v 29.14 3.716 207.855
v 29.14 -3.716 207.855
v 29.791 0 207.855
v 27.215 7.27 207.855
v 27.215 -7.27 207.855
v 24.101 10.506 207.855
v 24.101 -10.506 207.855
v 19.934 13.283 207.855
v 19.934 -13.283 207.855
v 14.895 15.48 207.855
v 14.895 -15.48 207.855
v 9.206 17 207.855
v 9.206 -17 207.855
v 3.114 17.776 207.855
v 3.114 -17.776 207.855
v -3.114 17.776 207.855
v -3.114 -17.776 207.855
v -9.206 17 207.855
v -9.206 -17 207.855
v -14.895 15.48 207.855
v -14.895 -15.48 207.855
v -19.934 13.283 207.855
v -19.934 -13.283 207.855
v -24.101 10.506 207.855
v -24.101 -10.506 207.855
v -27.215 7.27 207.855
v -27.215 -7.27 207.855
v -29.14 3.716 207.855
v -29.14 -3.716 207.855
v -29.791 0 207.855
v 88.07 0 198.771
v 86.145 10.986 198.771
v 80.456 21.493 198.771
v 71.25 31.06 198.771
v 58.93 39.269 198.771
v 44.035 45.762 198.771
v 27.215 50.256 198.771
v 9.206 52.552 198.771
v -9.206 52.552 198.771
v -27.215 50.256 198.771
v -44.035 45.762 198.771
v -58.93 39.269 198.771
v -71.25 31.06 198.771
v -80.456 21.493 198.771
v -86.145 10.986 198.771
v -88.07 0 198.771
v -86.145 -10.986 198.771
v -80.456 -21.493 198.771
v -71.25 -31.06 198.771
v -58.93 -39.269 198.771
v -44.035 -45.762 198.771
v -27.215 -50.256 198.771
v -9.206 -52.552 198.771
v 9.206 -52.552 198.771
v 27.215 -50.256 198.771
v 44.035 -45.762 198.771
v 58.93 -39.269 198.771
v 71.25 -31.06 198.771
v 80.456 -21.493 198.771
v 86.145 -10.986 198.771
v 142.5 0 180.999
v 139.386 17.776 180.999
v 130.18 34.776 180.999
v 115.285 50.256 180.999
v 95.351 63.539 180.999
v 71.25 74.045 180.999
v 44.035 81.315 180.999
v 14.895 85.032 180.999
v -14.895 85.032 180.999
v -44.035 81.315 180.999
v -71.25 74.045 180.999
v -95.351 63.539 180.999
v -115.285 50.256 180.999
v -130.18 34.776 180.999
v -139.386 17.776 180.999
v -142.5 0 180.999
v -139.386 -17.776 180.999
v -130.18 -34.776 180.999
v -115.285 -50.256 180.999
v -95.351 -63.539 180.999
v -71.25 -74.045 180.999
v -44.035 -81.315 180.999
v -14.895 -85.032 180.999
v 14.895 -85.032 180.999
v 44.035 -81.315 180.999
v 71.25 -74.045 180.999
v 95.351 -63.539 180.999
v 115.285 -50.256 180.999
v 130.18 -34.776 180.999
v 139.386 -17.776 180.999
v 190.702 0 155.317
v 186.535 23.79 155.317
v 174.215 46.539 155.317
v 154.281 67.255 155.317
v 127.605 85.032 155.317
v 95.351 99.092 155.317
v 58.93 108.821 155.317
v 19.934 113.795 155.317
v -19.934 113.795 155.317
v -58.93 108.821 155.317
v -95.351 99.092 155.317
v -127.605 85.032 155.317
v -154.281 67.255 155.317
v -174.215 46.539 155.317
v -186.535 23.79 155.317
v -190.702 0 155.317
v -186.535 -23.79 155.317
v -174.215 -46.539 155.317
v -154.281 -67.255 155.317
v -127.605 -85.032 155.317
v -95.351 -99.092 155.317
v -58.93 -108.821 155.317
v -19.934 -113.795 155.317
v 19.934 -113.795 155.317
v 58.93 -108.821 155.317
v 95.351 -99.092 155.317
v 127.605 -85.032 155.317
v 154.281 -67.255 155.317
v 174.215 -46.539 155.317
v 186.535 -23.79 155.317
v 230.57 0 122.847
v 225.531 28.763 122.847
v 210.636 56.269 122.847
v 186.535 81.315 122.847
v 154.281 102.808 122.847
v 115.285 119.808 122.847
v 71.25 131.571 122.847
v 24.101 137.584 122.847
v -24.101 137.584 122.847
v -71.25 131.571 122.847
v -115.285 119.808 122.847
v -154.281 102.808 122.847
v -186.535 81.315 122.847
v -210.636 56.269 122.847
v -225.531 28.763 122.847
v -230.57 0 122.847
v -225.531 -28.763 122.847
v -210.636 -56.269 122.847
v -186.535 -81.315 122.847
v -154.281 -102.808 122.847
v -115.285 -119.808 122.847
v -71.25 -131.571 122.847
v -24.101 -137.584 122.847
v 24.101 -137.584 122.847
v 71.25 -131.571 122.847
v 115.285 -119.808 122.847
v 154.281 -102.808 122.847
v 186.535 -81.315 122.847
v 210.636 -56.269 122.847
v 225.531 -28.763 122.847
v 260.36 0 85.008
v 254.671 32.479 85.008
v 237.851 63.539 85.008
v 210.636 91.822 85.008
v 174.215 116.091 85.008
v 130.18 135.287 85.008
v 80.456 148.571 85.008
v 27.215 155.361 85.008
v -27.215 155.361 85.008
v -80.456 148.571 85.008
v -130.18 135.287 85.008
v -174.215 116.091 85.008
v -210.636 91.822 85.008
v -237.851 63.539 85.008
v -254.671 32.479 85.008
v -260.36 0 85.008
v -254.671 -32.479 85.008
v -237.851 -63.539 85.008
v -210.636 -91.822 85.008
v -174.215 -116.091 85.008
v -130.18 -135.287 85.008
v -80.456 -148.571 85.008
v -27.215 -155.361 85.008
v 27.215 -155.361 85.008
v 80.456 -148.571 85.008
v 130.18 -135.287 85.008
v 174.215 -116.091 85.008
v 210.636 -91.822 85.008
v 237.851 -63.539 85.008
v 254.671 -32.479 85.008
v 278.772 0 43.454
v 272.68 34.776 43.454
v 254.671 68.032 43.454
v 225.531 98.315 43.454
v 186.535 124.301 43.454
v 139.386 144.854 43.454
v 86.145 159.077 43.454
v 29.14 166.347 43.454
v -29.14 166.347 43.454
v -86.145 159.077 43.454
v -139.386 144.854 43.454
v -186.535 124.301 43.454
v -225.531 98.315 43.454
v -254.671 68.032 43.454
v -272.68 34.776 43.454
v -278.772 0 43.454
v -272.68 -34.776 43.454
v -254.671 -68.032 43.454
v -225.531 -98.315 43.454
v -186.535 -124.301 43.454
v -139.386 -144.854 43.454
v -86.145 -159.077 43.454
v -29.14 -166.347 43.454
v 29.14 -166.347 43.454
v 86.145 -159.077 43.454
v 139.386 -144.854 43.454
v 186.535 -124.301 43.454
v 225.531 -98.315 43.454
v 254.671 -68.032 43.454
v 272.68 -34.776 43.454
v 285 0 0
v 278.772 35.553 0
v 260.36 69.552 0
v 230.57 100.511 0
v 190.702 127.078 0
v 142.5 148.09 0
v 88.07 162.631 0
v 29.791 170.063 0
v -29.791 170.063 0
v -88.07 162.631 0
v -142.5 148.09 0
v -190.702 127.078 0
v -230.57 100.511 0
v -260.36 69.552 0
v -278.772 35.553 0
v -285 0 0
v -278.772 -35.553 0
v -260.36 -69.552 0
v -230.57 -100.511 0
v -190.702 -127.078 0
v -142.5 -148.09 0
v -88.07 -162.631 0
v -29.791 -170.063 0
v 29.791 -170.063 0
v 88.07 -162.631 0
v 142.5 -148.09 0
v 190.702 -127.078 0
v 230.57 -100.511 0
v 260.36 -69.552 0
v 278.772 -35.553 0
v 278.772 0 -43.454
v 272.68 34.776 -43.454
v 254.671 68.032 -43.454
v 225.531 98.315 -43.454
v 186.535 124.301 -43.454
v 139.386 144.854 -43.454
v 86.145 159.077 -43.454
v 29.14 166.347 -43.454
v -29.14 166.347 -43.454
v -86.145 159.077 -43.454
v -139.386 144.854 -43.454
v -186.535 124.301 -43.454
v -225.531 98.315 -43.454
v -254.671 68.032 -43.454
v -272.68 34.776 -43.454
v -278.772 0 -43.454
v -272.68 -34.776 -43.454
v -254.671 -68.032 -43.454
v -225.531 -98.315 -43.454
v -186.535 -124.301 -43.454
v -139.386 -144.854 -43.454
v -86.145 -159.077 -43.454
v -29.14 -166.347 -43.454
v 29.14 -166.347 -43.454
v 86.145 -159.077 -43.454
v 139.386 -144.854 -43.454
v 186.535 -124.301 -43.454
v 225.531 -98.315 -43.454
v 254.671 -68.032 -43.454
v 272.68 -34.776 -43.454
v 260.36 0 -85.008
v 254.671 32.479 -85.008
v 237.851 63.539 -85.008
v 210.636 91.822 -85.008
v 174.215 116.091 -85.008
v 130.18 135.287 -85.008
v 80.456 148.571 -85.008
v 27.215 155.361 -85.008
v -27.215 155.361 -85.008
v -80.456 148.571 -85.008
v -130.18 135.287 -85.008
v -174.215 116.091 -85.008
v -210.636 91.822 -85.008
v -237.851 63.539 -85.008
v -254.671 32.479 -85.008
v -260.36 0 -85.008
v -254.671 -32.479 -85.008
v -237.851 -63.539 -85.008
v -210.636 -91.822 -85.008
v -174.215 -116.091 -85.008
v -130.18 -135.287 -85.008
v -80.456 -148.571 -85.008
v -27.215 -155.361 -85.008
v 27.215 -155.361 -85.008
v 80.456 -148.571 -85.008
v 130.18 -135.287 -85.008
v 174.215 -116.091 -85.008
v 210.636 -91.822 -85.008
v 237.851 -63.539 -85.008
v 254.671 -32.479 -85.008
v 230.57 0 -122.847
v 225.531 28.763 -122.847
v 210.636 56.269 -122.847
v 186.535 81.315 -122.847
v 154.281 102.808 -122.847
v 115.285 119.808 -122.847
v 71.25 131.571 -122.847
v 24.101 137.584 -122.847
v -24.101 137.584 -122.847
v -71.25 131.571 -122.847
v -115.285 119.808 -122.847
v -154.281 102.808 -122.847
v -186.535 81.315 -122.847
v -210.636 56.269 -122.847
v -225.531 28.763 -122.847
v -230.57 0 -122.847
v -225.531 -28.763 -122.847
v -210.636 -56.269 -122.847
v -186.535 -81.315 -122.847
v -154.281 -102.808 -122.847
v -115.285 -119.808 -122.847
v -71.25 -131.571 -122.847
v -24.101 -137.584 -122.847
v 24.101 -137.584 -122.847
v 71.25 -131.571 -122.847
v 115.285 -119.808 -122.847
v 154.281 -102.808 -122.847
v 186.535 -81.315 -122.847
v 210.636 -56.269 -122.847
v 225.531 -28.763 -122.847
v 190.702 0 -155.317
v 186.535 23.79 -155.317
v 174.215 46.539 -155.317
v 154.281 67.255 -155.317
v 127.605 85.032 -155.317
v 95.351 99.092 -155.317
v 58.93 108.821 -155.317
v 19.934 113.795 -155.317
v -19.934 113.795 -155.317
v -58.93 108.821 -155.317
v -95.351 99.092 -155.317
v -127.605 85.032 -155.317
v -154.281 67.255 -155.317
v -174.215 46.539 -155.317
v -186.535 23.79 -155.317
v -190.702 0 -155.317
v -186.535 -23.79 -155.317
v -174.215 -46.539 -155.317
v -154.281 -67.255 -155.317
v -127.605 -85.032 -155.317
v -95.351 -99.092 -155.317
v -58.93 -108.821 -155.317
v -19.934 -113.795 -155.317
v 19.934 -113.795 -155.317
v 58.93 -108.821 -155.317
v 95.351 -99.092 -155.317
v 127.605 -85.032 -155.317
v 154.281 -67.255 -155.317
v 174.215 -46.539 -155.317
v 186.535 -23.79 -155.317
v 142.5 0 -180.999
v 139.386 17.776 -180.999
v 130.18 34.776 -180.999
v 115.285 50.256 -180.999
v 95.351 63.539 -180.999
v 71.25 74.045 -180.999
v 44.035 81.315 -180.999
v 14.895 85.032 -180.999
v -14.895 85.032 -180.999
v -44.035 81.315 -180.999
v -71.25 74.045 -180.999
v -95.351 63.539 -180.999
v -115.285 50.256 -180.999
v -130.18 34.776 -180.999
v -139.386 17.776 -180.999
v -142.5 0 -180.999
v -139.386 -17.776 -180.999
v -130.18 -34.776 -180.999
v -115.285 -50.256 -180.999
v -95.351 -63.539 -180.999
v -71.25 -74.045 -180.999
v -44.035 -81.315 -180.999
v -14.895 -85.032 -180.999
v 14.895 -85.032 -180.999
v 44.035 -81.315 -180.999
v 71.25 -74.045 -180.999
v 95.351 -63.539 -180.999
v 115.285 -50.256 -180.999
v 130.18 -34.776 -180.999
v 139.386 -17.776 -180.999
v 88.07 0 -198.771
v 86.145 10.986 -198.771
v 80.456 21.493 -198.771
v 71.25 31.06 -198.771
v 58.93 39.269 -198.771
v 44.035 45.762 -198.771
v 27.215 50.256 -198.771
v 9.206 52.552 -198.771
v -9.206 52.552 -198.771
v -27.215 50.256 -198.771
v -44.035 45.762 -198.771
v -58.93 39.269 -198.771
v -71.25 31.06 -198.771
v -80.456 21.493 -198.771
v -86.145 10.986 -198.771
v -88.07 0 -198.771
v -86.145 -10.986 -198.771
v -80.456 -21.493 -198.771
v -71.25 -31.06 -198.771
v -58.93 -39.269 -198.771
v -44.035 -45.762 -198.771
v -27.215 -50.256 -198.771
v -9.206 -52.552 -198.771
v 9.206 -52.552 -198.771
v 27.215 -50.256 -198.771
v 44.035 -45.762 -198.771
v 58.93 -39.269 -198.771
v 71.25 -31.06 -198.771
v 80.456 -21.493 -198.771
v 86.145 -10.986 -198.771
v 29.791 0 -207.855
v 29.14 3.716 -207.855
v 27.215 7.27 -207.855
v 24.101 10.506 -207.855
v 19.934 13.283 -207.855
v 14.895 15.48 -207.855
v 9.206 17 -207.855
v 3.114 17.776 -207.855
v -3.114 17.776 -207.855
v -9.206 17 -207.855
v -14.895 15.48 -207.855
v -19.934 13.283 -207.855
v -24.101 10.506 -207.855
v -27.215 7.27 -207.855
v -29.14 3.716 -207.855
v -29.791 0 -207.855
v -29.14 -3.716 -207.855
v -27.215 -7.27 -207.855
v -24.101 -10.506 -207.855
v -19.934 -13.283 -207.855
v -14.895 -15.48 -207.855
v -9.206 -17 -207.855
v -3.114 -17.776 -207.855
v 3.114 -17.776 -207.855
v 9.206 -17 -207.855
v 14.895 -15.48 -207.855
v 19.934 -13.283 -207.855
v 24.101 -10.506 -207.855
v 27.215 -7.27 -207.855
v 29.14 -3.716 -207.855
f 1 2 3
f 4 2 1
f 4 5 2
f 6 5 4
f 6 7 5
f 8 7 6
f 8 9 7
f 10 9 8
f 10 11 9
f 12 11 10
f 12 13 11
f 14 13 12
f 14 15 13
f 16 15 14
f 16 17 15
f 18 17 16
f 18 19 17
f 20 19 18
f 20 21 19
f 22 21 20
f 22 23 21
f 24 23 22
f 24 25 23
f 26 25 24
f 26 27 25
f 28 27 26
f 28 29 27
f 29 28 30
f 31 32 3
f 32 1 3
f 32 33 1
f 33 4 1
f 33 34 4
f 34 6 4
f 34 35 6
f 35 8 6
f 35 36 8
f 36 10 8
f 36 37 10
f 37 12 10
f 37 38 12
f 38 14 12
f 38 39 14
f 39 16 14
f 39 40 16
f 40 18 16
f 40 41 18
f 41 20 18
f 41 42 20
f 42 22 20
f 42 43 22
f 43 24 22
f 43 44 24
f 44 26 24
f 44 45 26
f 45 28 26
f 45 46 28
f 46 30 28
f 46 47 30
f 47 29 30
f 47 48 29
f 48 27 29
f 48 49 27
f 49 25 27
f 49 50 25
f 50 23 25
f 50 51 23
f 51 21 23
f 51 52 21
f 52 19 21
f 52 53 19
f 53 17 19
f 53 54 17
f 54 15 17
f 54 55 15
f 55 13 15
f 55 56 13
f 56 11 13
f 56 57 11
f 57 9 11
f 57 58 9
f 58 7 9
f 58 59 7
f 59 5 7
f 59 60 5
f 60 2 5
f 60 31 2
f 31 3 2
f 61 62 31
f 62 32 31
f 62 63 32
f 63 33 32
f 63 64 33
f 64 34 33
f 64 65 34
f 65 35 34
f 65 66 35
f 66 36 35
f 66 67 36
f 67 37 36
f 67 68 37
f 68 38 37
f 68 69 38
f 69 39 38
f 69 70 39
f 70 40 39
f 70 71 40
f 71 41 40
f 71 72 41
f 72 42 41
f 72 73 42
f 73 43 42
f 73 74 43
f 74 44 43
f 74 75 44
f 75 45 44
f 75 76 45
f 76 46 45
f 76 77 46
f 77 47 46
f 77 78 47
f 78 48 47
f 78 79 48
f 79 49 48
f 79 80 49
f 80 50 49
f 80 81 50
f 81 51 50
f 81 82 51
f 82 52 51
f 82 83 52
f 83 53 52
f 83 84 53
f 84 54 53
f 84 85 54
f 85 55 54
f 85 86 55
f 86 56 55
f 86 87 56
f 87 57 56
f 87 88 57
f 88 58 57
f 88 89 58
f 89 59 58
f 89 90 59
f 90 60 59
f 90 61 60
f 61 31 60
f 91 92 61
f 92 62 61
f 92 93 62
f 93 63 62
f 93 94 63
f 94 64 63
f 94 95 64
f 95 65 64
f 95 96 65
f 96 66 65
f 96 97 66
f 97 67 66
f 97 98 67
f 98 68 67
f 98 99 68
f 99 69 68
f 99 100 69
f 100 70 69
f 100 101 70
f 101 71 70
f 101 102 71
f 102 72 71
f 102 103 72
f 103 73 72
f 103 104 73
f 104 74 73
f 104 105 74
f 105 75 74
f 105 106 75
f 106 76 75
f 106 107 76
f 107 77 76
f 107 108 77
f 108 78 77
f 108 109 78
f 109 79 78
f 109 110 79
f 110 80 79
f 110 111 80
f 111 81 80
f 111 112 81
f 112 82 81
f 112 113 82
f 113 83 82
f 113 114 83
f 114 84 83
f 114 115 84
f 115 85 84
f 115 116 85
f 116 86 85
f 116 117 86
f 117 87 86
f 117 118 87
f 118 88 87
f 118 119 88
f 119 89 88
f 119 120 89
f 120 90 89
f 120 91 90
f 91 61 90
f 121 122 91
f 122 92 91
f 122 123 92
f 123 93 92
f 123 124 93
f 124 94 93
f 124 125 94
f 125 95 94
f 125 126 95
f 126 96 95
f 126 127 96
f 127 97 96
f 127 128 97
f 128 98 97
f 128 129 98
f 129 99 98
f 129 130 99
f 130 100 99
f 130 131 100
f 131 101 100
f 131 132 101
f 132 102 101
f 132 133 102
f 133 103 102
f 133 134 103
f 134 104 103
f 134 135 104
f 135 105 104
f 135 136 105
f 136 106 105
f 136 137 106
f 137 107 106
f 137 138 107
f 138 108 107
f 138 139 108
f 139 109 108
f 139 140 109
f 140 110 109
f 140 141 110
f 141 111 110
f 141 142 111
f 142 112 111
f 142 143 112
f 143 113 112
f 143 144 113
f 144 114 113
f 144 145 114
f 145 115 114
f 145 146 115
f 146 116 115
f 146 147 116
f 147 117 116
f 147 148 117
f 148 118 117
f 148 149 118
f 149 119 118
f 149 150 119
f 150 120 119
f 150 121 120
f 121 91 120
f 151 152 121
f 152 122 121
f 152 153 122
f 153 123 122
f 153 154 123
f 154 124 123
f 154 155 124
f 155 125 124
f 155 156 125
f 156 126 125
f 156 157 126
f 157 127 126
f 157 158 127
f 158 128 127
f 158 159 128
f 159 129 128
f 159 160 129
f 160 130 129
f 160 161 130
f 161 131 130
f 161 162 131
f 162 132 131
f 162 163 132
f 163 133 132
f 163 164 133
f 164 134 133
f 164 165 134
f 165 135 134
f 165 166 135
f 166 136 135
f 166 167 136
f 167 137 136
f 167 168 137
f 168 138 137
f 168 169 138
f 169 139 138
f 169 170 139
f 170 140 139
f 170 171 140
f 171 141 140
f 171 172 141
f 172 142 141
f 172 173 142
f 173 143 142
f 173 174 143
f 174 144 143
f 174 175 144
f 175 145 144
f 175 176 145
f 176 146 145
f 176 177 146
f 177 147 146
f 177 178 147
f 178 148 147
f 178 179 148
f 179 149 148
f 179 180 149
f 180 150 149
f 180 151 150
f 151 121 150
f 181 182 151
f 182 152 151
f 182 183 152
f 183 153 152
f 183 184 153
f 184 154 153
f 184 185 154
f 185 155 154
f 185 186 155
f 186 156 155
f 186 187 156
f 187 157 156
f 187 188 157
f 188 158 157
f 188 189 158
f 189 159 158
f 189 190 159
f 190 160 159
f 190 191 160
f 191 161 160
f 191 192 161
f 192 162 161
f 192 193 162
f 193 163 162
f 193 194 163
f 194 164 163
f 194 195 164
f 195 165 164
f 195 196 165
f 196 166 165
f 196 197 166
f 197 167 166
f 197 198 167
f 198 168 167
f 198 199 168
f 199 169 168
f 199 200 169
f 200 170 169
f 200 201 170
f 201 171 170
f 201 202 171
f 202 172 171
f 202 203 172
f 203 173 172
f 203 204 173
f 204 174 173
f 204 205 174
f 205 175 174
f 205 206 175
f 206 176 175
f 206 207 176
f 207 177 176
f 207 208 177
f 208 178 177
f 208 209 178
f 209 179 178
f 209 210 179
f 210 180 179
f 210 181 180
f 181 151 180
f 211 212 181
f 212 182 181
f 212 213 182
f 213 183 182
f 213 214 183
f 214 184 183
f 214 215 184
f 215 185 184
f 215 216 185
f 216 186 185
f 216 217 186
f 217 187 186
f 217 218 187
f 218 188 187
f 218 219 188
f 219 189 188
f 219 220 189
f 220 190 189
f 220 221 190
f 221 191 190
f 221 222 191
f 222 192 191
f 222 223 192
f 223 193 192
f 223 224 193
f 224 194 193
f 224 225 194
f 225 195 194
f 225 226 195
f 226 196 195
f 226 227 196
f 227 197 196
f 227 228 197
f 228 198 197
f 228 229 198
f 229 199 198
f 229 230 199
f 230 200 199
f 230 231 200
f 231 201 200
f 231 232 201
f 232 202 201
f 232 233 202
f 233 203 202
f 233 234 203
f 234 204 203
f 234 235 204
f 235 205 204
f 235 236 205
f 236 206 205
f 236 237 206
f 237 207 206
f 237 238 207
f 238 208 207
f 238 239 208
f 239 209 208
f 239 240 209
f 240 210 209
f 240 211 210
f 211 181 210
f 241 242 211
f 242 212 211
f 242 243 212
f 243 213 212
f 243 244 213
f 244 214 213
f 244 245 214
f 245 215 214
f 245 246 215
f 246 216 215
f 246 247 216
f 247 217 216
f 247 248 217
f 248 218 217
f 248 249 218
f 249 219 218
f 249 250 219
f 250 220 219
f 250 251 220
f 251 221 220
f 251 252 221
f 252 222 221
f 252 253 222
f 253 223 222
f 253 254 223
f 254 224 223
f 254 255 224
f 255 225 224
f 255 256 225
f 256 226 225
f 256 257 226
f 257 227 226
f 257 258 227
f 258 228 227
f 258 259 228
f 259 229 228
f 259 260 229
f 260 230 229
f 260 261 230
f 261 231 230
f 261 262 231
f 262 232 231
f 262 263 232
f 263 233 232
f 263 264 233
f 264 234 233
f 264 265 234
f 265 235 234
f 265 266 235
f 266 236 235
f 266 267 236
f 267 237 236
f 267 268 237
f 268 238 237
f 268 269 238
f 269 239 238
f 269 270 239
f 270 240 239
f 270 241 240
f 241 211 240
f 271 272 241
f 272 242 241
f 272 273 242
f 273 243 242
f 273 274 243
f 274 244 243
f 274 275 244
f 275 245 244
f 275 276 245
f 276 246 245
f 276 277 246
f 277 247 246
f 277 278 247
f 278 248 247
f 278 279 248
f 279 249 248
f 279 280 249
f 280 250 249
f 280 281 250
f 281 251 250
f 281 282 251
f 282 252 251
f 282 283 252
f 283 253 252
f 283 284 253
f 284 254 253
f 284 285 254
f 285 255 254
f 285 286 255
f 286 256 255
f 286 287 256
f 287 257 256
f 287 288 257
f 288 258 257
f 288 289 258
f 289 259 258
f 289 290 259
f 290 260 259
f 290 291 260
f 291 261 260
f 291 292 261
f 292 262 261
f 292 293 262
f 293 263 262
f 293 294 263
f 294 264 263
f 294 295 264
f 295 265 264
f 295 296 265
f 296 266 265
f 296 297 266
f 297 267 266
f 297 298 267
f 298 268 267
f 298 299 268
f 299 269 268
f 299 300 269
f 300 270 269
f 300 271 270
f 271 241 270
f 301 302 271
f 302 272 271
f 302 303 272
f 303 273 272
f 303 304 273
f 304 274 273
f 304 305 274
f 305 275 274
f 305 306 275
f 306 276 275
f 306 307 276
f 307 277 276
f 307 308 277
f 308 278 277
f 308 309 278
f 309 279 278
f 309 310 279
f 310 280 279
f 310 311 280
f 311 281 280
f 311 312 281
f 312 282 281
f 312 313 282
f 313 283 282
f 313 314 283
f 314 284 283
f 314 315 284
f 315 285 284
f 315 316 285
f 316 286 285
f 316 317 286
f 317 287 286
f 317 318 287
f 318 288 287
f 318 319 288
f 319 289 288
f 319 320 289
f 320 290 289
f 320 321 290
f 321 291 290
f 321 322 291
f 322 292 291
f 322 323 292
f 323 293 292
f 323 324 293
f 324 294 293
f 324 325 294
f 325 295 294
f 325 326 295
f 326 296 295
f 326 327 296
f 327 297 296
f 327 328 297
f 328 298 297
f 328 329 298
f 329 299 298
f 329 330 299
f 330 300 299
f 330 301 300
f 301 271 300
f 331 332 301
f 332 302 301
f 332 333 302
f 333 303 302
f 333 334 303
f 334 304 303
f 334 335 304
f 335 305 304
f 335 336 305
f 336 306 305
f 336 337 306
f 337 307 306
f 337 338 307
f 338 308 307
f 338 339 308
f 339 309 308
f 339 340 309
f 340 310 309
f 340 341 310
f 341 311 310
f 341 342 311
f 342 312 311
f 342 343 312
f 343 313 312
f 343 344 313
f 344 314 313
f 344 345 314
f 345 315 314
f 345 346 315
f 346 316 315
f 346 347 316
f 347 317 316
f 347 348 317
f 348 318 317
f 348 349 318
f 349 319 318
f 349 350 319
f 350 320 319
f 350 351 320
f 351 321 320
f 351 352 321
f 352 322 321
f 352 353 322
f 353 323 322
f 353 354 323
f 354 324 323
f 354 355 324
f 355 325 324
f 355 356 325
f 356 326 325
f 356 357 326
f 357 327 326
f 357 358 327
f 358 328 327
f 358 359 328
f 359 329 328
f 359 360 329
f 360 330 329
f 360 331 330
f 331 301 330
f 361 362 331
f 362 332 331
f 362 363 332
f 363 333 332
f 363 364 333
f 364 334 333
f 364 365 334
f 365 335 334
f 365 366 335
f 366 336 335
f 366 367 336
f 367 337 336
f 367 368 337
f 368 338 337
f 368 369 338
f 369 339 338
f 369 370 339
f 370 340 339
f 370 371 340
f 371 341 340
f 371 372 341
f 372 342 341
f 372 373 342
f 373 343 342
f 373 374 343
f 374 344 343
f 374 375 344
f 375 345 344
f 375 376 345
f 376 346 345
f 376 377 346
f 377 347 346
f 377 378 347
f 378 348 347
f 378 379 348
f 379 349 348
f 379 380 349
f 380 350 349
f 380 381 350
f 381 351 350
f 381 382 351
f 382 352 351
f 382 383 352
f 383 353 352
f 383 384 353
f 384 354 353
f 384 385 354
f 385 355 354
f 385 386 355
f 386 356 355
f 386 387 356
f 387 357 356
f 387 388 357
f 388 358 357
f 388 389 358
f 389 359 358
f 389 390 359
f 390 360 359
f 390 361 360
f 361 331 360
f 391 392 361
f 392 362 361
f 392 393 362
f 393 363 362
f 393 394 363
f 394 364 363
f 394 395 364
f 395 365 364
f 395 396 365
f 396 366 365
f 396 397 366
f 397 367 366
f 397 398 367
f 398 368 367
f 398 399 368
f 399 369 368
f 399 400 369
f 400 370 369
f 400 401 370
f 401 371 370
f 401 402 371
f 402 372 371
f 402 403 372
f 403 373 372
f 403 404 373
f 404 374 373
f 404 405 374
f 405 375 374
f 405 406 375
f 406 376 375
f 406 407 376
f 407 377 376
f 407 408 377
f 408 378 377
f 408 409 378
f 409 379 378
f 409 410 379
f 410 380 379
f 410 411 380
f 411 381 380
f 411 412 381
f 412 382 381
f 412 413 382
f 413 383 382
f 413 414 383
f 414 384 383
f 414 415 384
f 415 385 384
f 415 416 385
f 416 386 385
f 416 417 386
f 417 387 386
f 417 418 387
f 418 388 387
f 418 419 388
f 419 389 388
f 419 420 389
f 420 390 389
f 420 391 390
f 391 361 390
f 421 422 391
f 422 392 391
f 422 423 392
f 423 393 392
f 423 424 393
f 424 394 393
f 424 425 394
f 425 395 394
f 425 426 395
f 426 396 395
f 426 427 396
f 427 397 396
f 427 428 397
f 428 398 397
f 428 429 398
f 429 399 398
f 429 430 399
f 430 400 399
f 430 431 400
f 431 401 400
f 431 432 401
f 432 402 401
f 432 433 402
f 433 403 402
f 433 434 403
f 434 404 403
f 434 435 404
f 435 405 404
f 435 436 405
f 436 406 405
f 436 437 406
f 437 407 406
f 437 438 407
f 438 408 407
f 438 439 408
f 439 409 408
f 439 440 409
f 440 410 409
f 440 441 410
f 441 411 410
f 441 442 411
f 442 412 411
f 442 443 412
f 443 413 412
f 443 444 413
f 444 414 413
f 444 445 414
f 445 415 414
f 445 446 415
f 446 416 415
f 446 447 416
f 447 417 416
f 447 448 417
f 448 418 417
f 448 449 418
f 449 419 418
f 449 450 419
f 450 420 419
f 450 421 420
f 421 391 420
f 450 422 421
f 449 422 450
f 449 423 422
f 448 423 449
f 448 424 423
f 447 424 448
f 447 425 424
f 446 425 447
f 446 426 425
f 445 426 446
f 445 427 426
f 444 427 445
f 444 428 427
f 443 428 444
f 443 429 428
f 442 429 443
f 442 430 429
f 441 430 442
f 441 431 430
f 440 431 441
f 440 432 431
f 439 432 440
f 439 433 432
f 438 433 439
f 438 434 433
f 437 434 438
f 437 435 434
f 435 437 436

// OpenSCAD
// Generated by SolidPython 1.0.1 on 2020-07-29 00:46:52


scale(v = [15, 9, 11]) {
	sphere(r = 19);
}
/***********************************************
*********      SolidPython code:      **********
************************************************
 
# import packages: SolidPython
from solid import *
from solid.utils import *
from itertools import chain, combinations, permutations


class Resize:

    def __init__(self, scad_file):
        self.scad_file = scad_file
        #self.scad_file = import_scad(scad_file)
        # cone/cylinder param:
        self.r1 = 0
        self.r2 = 0
        self.h = 0
        # rectangular prism param:
        self.w = 0
        self.l = 0
        # ellipse param:
        self.r = 0

    # import OpenScad code (file name corresponds to shape)


    # classify shape + parameters
    def assign(self, param1, param2, param3):
        if self.scad_file == 'cone.scad':
            self.r1 = param1
            self.r2 = param2
            self.h = param3
        elif self.scad_file == 'cylinder.scad':
            self.r1 = param1
            self.r2 = param2
            self.h = param3
        elif self.scad_file == 'rectangularPrism.scad':
            self.h = param1
            self.l = param2
            self.w = param3
        else:
            self.r = param1
            self.h = param2

    # resize parameters
    def iterate(self):
        x = range(3, 20, 2)
        i = 1
        if self.scad_file == 'cone.scad':
            tempList = list(permutations(x, 2))
            for temp in tempList:
                param1 = temp[0]
                param2 = temp[1]
                filepath = 'produced_scad_files/' + 'cone' + str(param1) + '_' + str(param2) + '_' + '.scad'
                scad_render_to_file(cylinder(h=param1, r1=param2, r2=0), filepath)

        elif self.scad_file == 'cylinder.scad':
            tempList = list(permutations(x, 3))
            for temp in tempList:
                param1 = temp[0]
                param2 = temp[1]
                filepath = 'produced_scad_files/' + 'cylinder' + str(param1) + '_' + str(param2) + '_' + '.scad'
                scad_render_to_file(cylinder(h=param1, r1=param2, r2=param2), filepath)

        elif self.scad_file == 'rectangularPrism.scad':
            tempList = list(permutations(x, 3))
            for temp in tempList:
                param1 = temp[0]
                param2 = temp[1]
                param3 = temp[2]
                filepath = 'produced_scad_files/' + 'rectangularPrism' + str(param1) + '_' + str(param2) + '_' + str(
                    param3) + '.scad'
                scad_render_to_file(cube(size=(param1, param2, param3)), filepath)

        elif self.scad_file == 'ellipse.scad':
            tempList = list(permutations(x, 4))
            for temp in tempList:
                param1 = temp[0]
                param2 = temp[1]
                param3 = temp[2]
                param4 = temp[3]
                filepath = 'produced_scad_files/' + 'ellipse' + str(param1) + '_' + str(param2) + '_' + str(param3) + '_' + str(param4) + '.scad'
                scad_render_to_file(scale([param1, param2, param3])(sphere(r=param4)), filepath)

    def render_to_scadfile(self):
        scad_render_to_file(scad, 'example.scad') 
 
************************************************/
